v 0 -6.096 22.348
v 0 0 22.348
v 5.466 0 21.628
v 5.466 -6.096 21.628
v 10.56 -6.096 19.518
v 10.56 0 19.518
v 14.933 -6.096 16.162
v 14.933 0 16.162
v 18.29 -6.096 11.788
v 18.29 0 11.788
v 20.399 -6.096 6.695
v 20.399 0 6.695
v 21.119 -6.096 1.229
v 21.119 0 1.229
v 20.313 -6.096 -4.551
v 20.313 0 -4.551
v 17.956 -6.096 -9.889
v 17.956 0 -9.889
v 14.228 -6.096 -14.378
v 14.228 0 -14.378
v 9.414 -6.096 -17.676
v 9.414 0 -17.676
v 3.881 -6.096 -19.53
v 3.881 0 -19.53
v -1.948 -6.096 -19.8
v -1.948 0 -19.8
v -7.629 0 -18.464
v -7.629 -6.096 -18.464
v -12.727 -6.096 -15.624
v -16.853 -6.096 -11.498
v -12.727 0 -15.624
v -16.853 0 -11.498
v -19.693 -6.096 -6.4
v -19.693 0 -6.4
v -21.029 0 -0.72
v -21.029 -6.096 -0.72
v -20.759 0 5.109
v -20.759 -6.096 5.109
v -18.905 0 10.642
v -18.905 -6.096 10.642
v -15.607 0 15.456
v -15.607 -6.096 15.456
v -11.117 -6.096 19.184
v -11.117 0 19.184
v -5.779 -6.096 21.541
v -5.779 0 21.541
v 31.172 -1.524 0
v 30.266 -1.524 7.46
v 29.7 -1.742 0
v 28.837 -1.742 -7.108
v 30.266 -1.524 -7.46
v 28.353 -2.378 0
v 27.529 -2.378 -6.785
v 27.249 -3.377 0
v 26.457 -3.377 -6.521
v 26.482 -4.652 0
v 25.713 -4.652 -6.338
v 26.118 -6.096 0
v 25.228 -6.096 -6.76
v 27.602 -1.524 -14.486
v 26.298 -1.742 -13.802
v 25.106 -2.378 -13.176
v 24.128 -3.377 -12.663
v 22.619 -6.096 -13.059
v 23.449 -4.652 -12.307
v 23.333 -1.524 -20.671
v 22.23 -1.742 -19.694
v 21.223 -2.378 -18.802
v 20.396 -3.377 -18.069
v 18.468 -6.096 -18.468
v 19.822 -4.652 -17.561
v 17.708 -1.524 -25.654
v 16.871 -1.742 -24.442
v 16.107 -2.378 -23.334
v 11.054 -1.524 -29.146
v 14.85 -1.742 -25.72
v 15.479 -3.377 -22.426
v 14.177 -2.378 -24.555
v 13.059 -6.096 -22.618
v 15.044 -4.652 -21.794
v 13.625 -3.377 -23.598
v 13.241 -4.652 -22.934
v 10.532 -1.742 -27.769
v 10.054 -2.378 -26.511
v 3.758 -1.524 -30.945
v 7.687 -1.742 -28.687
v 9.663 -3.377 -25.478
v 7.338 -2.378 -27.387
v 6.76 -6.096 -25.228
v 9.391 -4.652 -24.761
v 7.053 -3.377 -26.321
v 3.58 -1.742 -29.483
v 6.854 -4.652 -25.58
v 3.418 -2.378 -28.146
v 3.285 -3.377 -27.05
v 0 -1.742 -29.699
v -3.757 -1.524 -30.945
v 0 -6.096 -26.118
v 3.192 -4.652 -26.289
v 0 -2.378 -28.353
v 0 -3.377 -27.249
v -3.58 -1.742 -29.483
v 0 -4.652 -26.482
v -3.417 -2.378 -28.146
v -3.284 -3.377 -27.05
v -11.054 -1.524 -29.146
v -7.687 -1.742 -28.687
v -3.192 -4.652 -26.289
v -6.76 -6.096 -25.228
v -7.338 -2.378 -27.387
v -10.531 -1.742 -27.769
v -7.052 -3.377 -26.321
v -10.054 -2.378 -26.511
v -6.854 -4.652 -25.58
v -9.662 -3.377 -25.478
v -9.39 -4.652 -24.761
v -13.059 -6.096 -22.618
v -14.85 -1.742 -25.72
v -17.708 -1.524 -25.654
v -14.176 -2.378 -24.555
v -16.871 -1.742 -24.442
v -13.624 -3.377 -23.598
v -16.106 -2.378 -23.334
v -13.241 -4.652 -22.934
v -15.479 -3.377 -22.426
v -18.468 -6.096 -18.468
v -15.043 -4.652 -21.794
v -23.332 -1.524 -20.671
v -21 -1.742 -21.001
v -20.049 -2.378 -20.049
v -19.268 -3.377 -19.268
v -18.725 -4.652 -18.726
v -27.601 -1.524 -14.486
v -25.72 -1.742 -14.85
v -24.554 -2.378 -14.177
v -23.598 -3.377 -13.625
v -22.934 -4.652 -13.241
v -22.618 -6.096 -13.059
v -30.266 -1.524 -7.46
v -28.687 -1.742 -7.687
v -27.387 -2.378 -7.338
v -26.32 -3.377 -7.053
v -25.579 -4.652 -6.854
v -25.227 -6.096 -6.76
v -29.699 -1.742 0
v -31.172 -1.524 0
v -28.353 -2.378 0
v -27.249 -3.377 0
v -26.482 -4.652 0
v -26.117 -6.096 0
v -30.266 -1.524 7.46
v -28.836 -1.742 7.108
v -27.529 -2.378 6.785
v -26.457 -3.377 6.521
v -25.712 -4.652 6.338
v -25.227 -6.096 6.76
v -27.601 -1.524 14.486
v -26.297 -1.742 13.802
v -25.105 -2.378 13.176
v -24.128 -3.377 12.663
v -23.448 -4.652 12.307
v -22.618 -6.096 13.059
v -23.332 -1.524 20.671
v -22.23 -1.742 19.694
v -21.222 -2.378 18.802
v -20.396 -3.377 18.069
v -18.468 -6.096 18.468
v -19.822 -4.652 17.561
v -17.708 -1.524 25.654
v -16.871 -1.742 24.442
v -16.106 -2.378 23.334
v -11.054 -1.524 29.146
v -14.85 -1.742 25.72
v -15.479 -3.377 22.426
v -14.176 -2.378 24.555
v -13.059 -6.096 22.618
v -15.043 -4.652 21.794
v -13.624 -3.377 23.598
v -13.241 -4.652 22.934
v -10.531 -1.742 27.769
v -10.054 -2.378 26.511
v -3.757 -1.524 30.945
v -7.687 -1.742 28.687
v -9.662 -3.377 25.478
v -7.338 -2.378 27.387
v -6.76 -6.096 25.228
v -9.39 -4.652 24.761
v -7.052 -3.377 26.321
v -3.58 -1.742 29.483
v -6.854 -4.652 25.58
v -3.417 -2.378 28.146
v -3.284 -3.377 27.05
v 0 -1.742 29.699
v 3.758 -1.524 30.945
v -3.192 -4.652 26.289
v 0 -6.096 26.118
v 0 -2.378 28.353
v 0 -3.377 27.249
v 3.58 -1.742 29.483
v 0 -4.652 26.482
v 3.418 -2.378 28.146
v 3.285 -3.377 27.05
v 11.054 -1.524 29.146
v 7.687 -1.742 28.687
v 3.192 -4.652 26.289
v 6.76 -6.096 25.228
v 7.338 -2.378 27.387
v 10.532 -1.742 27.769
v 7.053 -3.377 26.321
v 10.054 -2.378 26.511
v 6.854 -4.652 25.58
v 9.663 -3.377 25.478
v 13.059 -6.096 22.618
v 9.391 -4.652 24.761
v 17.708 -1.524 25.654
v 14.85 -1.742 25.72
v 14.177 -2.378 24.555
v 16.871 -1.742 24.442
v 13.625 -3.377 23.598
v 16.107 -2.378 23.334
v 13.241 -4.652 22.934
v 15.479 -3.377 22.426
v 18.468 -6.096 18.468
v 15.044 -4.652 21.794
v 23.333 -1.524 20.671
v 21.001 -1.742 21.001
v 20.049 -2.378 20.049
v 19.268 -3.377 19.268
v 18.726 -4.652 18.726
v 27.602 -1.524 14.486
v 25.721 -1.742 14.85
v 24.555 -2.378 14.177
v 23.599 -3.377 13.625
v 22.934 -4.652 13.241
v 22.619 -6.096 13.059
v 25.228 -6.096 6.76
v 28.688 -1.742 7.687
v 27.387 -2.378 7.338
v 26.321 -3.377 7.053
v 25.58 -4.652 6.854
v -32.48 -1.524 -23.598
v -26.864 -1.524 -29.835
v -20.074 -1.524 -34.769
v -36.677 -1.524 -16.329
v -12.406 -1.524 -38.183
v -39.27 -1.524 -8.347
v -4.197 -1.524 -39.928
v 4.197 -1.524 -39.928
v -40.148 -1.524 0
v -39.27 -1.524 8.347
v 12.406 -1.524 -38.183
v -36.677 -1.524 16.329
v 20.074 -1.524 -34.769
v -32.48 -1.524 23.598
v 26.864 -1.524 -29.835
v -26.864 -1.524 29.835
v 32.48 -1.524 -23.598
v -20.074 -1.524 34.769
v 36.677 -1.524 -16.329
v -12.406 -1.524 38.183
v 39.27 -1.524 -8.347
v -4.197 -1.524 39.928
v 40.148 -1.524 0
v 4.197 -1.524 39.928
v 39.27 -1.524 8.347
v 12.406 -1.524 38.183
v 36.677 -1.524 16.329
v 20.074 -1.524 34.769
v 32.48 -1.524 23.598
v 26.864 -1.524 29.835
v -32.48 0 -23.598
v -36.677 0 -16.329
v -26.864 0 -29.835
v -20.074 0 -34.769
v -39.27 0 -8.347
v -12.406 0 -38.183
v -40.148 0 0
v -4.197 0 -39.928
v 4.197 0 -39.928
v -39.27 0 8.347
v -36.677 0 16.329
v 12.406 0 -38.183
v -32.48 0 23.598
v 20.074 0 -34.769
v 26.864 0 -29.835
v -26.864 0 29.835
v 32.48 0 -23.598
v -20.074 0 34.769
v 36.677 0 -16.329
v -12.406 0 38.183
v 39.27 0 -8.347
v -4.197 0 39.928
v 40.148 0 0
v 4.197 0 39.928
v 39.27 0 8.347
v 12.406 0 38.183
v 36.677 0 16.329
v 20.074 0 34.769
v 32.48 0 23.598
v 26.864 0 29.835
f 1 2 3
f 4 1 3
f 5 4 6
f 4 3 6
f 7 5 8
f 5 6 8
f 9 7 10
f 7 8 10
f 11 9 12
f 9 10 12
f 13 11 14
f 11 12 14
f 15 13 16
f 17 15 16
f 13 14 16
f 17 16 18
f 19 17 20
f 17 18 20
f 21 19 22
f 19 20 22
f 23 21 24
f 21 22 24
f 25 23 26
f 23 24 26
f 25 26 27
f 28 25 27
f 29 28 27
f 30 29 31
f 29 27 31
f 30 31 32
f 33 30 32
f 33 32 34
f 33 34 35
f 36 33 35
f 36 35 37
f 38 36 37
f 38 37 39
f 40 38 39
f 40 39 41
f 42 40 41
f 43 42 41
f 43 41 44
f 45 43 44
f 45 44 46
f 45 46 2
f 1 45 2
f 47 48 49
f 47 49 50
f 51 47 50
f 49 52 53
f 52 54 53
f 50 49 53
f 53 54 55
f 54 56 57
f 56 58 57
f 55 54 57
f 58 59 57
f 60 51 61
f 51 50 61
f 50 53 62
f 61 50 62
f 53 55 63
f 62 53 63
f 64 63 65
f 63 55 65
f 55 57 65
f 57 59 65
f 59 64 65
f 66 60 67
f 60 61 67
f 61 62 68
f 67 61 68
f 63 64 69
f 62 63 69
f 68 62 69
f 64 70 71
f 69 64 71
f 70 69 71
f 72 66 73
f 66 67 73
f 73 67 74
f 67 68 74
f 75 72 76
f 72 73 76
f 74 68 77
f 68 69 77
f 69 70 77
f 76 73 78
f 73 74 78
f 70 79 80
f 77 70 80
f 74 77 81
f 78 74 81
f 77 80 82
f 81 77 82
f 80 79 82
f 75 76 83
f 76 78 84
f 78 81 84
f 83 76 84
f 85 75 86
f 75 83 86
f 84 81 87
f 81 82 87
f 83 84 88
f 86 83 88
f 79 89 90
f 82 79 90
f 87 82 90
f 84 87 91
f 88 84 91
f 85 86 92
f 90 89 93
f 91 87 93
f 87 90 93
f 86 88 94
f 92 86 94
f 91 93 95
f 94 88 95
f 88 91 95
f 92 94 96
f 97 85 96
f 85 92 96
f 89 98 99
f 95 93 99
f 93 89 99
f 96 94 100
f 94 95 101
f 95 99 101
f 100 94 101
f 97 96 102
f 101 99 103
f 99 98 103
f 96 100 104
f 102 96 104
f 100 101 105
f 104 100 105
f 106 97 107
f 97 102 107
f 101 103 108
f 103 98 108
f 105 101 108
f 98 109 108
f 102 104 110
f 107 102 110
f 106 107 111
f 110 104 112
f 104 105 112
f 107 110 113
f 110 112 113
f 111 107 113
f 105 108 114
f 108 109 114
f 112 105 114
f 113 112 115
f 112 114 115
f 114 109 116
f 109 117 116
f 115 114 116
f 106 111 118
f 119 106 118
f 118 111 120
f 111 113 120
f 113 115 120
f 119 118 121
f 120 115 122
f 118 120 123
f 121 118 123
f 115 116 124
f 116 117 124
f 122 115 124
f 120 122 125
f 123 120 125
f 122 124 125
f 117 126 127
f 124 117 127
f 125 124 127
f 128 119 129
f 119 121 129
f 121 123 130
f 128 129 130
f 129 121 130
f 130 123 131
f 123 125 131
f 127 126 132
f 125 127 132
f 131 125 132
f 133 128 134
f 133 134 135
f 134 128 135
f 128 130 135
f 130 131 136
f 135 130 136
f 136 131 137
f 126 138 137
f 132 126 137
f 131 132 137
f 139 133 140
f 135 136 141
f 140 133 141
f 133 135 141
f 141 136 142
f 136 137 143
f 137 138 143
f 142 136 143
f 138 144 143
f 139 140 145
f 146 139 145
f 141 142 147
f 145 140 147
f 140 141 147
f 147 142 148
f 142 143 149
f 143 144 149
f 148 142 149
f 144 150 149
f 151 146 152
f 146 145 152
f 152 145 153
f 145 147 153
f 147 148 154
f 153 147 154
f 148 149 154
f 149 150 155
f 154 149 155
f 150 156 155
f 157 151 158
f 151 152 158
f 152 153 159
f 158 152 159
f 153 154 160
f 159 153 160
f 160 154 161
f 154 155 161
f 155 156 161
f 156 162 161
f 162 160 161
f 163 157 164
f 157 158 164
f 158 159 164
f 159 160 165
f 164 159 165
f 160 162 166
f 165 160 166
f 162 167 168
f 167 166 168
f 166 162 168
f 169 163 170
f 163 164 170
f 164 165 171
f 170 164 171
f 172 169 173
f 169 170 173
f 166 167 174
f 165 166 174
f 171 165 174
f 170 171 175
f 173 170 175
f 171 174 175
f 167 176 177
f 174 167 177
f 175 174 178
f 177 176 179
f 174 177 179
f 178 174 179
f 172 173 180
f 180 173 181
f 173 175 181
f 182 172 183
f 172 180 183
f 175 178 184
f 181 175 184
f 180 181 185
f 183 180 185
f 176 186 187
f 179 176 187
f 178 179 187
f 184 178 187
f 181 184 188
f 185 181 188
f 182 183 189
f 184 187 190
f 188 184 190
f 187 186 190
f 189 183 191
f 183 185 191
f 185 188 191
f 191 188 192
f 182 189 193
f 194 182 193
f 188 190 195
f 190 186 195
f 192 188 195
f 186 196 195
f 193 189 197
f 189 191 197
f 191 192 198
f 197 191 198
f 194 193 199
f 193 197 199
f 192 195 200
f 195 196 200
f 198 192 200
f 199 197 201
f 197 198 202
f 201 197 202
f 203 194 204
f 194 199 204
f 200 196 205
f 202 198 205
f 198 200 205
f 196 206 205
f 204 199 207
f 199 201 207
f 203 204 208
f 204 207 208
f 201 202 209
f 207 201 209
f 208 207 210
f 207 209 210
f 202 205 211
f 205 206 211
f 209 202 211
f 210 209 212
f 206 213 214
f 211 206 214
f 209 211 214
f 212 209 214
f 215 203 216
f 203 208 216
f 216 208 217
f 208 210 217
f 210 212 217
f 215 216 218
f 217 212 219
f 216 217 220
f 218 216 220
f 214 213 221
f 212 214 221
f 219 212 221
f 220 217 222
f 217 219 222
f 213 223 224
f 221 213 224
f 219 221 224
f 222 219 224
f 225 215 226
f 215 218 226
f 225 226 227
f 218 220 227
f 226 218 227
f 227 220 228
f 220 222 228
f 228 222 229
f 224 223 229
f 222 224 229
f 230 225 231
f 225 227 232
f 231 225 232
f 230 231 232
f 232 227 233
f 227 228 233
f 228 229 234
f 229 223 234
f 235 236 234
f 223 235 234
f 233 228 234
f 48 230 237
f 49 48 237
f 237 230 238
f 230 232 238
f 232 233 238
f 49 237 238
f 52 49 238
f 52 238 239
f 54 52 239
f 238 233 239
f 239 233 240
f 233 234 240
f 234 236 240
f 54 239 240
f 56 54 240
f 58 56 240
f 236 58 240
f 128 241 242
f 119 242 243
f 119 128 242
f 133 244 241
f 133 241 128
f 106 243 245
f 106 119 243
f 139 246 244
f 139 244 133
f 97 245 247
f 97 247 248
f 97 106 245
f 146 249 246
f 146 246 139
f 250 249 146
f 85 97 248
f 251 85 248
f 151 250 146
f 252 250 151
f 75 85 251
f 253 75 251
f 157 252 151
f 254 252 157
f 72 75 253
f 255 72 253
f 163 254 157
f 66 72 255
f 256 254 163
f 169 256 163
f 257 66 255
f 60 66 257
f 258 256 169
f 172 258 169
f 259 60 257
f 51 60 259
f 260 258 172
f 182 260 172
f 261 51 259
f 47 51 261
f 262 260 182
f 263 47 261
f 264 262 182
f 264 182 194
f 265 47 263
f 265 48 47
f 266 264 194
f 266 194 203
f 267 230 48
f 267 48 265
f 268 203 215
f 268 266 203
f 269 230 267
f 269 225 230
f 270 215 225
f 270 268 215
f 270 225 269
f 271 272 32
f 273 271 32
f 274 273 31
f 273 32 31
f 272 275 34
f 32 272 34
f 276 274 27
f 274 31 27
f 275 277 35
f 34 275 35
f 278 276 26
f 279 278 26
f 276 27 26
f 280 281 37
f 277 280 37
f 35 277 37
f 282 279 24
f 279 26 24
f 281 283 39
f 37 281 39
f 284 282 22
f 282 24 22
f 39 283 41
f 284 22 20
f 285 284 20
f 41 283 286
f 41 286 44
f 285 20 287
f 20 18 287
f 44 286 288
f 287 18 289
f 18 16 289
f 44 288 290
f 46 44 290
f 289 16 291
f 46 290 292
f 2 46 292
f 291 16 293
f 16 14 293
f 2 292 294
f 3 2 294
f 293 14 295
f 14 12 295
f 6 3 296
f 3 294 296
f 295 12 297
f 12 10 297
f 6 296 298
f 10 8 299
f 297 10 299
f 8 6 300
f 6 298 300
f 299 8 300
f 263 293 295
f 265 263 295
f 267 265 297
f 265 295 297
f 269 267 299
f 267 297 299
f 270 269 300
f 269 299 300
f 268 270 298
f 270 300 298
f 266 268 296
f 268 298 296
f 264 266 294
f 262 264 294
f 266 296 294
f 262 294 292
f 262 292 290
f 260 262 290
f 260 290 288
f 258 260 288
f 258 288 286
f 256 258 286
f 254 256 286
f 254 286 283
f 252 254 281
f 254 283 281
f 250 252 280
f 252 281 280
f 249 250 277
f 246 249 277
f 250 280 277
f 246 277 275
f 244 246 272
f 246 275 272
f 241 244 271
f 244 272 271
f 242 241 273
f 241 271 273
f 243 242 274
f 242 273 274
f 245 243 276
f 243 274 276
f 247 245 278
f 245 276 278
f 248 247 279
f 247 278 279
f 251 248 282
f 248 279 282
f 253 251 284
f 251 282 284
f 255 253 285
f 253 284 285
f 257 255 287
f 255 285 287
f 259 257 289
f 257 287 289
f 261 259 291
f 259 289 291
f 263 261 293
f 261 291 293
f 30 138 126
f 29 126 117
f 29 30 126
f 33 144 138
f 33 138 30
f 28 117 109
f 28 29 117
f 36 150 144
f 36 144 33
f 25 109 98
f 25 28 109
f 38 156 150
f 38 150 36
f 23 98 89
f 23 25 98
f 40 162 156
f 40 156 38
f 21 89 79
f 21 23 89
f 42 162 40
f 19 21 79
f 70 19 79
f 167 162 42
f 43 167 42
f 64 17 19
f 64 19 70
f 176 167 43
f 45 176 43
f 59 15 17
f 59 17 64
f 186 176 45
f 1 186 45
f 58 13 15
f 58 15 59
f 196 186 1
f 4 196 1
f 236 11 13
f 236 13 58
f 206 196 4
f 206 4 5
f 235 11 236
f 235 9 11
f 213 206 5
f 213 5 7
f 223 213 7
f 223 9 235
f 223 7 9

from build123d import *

# Parameters (mm, degrees)
F0_R     = 40.1475524572
F0_R_2   = 26.11755
F1_DEPTH = 1.524
F2_DEPTH = 6.096


# Not quite as in the source:
# - a fillet or chamfer that OpenCascade refuses, or shapes differently, is made with other operations: its cross-section is extruded or revolved along the edge and cut away or added


with BuildPart() as f1:
    # F0 (on Front) → F1 (new body)
    with BuildSketch(Plane.XZ):
        Circle(F0_R)
        with Locations((0.0001517863, 0)):
            Circle(F0_R_2, mode=Mode.SUBTRACT)
        with Locations((0.0001517863, 0)):
            Circle(F0_R_2)
        with BuildLine():
            ThreePointArc((0.0001517863, 22.3475835458), (14.93341969, 16.1620214495), (21.1189817863, 1.2287535458))
            ThreePointArc((21.1189817863, 1.2287535458), (-14.9331161175, -13.704514358), (0.0001517863, 22.3475835458))
        make_face(mode=Mode.SUBTRACT)
    extrude(amount=F1_DEPTH)

    # F0 (on Front) → F2 (join)
    with BuildSketch(Plane.XZ):
        with Locations((0.0001517863, 0)):
            Circle(F0_R_2)
        with BuildLine():
            ThreePointArc((0.0001517863, 22.3475835458), (14.93341969, 16.1620214495), (21.1189817863, 1.2287535458))
            ThreePointArc((21.1189817863, 1.2287535458), (-14.9331161175, -13.704514358), (0.0001517863, 22.3475835458))
        make_face(mode=Mode.SUBTRACT)
    extrude(amount=F2_DEPTH)

    # F3: fillet of radius 5.08 on 1 edges, made by hand

    # F3_s1 → F3_t2 (revolve)
    with BuildSketch(Plane.XY):
        with BuildLine():
            ThreePointArc((31.1722379668, -1.524), (27.764470369, -2.8365711686), (26.1177017863, -6.096))
            Line((26.1177017863, -6.096), (26.1177017863, -1.524))
            Line((26.1177017863, -1.524), (31.1722379668, -1.524))
        make_face()
    revolve(axis=Axis((0.0001517863, -1.524, 0), (0, 1, 0)))


solid = f1.part
